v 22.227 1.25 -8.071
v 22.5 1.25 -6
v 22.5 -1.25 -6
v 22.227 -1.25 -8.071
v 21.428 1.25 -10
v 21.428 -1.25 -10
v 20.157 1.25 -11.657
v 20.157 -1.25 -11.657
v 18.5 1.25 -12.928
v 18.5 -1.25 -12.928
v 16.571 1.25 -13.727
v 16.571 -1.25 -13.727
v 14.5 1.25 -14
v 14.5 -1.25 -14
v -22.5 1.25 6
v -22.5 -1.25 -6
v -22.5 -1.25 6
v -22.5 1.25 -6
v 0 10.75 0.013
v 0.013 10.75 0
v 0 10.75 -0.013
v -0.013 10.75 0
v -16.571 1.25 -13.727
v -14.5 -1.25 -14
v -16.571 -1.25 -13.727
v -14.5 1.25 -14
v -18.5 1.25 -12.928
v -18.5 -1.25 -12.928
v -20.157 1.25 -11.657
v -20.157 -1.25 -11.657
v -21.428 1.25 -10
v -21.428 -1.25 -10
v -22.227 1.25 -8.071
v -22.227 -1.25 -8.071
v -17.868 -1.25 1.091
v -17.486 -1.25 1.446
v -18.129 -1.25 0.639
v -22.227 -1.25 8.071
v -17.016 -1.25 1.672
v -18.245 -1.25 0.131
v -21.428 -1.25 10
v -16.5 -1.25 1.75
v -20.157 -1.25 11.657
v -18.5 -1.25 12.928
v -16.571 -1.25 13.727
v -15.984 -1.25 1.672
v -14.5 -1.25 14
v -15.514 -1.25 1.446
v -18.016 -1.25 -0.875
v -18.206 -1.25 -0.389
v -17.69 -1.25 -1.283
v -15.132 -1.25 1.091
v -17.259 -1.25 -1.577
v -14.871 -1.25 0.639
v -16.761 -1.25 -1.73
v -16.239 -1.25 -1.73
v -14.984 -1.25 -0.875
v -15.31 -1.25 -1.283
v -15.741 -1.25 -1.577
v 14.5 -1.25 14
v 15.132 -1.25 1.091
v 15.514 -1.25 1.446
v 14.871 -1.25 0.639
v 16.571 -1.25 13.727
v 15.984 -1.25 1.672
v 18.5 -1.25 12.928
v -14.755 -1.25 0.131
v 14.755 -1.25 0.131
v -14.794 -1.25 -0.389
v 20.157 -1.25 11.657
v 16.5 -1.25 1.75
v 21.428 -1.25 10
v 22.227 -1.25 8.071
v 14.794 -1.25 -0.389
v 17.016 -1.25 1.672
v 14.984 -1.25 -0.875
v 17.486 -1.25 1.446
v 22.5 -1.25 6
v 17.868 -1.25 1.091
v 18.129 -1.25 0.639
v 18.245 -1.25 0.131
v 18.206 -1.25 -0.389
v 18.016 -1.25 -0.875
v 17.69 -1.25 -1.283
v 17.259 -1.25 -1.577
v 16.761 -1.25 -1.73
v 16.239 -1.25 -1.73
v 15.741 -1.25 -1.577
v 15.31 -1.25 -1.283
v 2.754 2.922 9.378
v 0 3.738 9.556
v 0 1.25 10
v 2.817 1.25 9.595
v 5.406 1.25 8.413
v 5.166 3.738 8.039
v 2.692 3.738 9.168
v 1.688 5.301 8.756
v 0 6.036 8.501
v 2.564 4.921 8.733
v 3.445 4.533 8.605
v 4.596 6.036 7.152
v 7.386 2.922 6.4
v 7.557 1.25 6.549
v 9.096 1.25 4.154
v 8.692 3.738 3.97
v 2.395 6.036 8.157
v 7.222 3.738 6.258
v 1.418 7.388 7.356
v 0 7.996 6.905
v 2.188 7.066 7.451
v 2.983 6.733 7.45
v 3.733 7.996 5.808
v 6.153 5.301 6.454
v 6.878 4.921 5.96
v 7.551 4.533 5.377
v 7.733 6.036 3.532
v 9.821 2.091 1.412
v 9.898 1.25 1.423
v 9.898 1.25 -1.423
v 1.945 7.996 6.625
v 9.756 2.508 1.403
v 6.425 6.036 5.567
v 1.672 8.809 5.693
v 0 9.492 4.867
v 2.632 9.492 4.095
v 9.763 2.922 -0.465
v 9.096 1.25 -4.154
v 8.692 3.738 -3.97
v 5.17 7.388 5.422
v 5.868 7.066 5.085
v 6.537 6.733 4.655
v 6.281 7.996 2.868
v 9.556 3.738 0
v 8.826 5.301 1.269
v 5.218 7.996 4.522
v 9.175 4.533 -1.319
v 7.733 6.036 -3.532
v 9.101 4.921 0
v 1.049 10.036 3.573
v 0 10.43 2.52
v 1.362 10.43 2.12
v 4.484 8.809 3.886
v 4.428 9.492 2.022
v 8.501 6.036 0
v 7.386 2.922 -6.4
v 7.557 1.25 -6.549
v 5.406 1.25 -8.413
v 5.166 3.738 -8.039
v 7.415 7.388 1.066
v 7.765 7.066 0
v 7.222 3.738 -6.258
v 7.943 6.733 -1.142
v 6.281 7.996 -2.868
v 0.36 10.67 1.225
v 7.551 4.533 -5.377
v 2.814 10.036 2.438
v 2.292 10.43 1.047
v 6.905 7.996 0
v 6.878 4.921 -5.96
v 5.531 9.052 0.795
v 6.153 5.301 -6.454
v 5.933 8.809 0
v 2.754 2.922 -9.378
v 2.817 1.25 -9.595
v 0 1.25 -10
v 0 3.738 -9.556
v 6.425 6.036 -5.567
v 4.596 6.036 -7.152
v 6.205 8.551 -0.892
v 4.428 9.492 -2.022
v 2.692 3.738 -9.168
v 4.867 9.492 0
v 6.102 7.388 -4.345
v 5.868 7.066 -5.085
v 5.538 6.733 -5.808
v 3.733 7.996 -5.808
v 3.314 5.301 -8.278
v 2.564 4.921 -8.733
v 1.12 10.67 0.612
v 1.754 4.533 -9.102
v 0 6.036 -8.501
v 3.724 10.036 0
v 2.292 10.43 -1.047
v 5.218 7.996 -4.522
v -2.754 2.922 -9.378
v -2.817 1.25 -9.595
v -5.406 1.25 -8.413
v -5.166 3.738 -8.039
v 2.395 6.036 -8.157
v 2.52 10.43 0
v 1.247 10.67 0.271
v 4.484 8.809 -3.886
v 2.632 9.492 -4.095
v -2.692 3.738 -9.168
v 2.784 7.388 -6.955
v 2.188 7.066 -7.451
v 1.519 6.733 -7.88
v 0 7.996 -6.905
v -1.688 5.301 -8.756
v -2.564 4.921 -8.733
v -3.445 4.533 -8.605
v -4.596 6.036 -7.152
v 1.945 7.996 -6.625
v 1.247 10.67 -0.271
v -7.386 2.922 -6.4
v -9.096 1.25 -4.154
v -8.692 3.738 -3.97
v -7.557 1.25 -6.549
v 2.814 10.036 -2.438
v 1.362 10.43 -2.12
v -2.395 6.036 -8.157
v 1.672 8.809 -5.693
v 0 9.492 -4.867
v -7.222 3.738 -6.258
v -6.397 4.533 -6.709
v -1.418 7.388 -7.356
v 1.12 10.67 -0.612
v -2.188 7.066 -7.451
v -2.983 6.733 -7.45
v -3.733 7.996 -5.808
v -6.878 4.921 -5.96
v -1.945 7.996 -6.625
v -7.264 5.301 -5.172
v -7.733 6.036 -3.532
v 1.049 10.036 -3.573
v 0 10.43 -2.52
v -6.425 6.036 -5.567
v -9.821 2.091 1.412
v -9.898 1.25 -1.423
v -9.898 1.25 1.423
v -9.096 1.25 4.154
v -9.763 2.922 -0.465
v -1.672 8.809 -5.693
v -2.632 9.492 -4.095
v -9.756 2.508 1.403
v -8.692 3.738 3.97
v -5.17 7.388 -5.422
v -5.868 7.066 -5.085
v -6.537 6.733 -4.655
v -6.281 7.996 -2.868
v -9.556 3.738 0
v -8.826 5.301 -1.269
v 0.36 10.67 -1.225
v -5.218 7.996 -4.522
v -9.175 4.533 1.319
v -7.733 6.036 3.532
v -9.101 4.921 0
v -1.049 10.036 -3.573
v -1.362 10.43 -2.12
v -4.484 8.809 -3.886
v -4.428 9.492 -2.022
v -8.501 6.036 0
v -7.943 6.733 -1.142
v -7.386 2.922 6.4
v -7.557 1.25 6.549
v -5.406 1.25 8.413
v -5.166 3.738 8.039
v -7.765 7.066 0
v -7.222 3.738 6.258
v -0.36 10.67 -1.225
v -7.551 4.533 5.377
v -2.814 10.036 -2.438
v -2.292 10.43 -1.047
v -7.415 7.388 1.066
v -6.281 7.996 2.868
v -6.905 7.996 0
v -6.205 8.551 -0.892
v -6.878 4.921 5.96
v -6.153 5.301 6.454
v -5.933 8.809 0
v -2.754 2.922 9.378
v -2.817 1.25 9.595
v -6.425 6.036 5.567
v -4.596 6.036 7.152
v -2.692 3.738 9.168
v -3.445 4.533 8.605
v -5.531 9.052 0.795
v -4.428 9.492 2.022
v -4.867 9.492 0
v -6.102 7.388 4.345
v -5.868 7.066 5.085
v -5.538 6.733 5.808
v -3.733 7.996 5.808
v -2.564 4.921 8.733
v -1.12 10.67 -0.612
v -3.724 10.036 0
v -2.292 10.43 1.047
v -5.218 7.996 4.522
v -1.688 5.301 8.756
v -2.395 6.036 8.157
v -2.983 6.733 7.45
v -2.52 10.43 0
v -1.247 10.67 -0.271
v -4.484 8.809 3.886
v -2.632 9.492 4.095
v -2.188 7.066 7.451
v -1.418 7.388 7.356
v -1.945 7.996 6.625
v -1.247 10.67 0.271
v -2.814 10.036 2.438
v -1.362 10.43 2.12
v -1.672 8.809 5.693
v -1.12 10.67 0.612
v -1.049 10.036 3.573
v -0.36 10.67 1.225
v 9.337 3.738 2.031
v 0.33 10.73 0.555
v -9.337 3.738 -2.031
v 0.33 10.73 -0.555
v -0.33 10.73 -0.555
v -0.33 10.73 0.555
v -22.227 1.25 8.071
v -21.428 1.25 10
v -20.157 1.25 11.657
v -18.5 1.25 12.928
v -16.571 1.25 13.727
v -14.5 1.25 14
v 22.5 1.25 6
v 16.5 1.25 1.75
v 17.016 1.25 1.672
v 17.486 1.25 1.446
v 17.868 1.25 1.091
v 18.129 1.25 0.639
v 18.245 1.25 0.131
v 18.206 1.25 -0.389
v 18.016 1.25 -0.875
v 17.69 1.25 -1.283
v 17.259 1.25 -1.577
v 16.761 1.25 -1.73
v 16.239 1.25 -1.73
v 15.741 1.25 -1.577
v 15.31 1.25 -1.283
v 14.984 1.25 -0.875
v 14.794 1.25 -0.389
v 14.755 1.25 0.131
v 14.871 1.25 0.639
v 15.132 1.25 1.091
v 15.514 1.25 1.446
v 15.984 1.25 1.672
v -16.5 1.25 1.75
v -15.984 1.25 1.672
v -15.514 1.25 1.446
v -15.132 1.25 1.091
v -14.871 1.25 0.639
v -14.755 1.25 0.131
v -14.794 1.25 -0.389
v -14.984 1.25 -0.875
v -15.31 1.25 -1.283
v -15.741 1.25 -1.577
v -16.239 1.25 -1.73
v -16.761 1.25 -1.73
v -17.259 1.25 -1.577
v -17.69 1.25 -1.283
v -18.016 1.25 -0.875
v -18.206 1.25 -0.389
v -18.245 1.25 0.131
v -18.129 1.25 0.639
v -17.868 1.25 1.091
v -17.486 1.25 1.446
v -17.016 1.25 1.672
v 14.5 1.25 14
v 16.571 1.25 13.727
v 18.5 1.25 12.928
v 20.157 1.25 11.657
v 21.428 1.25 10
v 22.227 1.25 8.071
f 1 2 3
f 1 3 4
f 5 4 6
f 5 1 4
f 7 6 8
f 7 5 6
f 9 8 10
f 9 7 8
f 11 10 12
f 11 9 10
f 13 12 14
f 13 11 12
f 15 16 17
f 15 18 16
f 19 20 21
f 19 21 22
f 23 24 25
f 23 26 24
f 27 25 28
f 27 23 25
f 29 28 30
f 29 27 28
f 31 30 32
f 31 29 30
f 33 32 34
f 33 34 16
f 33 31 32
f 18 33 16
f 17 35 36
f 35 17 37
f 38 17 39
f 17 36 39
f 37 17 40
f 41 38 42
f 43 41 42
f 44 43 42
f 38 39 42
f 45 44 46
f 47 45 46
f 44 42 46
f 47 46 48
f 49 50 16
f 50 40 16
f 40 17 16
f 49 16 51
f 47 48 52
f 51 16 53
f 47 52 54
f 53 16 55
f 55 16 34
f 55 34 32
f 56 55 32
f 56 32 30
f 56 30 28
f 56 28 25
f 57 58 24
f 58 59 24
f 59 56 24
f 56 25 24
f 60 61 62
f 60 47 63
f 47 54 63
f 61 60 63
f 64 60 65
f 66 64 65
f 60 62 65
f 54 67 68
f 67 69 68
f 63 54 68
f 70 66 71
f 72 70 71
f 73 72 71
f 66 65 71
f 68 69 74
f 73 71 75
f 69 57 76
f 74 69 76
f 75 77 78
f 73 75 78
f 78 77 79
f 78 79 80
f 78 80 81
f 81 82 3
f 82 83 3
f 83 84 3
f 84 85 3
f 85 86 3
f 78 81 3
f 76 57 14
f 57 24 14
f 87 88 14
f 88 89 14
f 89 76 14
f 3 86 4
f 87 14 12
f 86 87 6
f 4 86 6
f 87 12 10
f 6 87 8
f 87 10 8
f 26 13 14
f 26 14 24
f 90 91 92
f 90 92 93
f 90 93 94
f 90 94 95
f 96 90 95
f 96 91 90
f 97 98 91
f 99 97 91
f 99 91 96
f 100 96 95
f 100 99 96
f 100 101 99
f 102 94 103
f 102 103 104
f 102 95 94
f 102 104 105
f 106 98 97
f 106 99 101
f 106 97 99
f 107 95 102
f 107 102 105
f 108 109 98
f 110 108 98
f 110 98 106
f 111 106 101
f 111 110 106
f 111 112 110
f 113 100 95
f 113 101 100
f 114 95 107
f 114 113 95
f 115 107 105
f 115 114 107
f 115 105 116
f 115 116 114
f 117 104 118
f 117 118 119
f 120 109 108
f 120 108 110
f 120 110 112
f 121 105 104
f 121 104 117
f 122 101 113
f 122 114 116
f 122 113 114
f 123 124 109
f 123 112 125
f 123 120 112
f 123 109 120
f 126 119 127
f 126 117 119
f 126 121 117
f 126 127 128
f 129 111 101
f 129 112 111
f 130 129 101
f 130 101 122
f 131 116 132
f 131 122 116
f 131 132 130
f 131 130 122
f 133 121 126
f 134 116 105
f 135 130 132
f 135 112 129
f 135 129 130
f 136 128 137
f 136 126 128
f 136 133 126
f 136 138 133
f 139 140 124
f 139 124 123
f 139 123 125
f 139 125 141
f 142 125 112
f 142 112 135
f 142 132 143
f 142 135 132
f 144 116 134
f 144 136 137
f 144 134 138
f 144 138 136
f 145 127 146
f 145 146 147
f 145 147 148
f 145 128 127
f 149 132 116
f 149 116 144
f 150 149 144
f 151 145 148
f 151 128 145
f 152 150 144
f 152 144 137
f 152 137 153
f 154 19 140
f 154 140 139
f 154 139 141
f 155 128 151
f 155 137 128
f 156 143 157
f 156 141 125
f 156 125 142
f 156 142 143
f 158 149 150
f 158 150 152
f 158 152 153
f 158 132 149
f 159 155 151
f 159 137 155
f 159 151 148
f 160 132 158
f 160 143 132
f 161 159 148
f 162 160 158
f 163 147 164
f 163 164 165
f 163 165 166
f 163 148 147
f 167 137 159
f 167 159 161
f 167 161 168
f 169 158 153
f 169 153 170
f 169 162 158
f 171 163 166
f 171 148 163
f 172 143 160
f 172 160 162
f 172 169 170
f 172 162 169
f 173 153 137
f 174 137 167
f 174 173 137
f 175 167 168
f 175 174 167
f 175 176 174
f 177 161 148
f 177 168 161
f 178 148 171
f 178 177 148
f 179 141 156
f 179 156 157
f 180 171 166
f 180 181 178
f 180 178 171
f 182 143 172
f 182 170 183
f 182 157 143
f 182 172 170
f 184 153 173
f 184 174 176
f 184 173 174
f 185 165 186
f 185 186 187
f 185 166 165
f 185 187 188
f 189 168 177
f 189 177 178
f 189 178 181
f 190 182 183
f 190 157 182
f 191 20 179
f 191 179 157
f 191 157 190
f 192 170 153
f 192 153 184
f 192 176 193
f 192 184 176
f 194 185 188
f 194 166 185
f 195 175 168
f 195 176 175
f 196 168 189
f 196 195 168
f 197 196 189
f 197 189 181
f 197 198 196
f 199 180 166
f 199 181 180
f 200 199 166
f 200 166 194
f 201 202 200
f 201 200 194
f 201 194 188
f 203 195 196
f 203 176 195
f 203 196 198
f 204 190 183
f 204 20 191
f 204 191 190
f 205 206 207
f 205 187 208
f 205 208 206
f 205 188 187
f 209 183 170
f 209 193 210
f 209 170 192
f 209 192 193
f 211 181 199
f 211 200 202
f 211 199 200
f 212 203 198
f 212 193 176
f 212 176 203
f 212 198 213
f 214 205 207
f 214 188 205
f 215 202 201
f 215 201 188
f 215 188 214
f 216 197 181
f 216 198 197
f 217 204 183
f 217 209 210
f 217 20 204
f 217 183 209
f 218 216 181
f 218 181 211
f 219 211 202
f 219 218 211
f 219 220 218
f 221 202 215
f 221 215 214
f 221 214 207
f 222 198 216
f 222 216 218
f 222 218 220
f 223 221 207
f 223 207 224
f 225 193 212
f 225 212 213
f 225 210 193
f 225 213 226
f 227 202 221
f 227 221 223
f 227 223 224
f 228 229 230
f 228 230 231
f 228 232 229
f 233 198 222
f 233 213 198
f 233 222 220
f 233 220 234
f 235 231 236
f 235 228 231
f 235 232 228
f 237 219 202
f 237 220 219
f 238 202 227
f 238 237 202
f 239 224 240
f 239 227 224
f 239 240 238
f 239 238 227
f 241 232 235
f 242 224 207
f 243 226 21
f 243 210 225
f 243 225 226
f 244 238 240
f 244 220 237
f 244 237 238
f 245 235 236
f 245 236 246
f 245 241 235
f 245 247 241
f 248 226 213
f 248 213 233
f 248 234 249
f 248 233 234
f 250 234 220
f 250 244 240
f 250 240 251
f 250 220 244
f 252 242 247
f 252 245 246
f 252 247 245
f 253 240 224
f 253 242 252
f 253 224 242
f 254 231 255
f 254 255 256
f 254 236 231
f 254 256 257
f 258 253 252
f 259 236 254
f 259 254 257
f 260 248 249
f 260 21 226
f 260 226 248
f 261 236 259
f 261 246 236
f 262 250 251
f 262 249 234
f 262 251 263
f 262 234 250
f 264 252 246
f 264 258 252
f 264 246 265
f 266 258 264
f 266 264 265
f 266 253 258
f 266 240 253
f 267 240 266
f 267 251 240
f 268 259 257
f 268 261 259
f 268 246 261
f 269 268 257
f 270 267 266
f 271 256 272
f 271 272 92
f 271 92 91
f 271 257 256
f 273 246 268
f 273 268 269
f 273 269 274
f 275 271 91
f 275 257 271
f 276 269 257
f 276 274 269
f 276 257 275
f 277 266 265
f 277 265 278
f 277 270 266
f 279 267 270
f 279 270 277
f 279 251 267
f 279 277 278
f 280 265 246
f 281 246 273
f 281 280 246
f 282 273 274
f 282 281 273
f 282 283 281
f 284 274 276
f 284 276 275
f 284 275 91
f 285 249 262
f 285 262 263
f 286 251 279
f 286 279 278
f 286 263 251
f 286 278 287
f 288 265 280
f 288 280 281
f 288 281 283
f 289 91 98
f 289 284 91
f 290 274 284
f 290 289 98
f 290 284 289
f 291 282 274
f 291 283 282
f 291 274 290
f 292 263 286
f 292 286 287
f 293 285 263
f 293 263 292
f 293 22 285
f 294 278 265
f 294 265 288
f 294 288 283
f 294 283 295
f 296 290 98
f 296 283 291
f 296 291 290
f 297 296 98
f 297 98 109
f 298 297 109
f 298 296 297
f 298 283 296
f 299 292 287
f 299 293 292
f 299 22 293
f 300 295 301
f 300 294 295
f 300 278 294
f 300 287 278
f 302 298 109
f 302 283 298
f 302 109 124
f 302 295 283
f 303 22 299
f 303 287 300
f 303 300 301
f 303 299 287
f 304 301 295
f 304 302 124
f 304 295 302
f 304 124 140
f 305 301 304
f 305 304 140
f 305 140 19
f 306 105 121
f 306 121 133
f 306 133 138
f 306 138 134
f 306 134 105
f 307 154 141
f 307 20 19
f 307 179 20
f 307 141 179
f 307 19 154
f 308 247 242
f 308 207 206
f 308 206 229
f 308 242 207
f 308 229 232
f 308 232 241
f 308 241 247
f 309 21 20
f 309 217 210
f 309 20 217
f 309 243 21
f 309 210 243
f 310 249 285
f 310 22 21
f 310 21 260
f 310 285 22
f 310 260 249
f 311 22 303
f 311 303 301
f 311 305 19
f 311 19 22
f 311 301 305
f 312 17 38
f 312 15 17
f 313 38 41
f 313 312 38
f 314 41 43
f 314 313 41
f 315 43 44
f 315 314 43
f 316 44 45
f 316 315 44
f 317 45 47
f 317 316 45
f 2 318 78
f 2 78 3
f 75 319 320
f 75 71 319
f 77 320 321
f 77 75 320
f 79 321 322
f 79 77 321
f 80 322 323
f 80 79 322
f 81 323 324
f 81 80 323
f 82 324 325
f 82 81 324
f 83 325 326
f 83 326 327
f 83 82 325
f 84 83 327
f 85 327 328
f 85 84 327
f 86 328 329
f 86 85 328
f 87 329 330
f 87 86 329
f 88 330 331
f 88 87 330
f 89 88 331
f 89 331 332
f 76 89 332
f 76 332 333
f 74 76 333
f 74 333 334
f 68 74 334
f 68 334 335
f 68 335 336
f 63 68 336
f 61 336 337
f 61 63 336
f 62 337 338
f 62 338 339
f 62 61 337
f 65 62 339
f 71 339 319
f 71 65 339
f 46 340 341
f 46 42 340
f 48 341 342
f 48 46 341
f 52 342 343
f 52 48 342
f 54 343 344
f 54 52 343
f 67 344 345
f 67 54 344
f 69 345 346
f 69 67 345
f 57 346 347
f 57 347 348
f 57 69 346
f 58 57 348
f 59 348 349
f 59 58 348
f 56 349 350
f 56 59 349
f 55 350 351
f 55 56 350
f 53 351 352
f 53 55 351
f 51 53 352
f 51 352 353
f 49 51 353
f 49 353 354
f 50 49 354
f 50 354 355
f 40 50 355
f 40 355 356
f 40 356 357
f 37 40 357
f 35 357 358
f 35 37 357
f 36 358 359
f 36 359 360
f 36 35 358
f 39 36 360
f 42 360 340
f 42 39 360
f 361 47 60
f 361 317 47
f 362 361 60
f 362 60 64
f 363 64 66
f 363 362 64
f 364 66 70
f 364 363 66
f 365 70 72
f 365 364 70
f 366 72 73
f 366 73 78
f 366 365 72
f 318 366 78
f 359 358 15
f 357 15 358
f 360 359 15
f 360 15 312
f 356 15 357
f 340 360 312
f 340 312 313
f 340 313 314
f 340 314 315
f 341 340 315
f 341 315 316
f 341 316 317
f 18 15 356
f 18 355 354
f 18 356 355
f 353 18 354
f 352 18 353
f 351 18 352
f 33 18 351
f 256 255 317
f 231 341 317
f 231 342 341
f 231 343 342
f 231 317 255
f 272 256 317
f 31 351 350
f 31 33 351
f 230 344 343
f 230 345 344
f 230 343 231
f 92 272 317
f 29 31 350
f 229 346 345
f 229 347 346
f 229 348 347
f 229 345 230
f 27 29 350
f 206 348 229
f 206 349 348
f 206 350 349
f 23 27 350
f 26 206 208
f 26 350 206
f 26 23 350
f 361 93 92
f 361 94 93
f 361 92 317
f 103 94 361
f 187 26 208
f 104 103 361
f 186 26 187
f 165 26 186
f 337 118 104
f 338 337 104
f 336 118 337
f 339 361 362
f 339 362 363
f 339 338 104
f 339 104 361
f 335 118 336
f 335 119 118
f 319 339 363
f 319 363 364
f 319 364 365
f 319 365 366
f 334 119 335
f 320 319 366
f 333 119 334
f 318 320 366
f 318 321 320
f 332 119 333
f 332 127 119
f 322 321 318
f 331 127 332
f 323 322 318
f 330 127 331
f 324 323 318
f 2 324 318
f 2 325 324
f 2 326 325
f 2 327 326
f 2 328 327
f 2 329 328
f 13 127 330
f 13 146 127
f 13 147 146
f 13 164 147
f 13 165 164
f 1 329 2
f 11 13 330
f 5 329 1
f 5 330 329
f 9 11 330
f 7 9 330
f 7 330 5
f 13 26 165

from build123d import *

# Parameters (mm, degrees)
SKETCH1_R           = 1.75
BOSS_EXTRUDE1_DEPTH = 1.25
SKETCH2_R           = 10
BOSS_EXTRUDE2_DEPTH = 9.5
FILLET1_R           = 10


with BuildPart() as part:
    # Sketch1 → Boss-Extrude1 (new, symmetric)
    with BuildSketch(Plane(origin=(0, 0, 0), x_dir=(1, 0, 0), z_dir=(0, 1, 0))):
        with BuildLine():
            Line((-14.5, -14), (14.5, -14))
            ThreePointArc((14.5, -14), (20.156854249, -11.656854249), (22.5, -6))
            Line((22.5, -6), (22.5, 6))
            ThreePointArc((22.5, 6), (20.156854249, 11.656854249), (14.5, 14))
            Line((14.5, 14), (-14.5, 14))
            ThreePointArc((-14.5, 14), (-20.156854249, 11.656854249), (-22.5, 6))
            Line((-22.5, 6), (-22.5, -6))
            ThreePointArc((-22.5, -6), (-20.156854249, -11.656854249), (-14.5, -14))
        make_face()
        with Locations(Location((16.5, 0, 0), (0, 0, 270))):
            Circle(SKETCH1_R, mode=Mode.SUBTRACT)
        with Locations(Location((-16.5, 0, 0), (0, 0, 270))):
            Circle(SKETCH1_R, mode=Mode.SUBTRACT)
    extrude(amount=BOSS_EXTRUDE1_DEPTH, both=True)

    # Sketch2 → Boss-Extrude2 (add)
    with BuildSketch(Plane(origin=(0, 1.25, 0), x_dir=(1, 0, 0), z_dir=(0, 1, 0))):
        with Locations(Location((0, 0, 0), (0, 0, 270))):
            Circle(SKETCH2_R)
    extrude(amount=BOSS_EXTRUDE2_DEPTH)

    # Fillet1
    # the kernel refuses this fillet: 10 mm, written as the material it takes off along each edge
    with BuildSketch(Plane(origin=(0, 10.75, 0), x_dir=(0, 0, 1), z_dir=(-1, 0, 0))) as fillet1_piece_1:
        with BuildLine():
            CenterArc((0.012507822, -10), FILLET1_R, 2.865983983, 87.134016017)
            Line((0.012507822, 0), (0.012507822, 0.2))
            Line((0.012507822, 0.2), (10, 0.2))
            Line((10, 0.2), (10.2, 0))
            ThreePointArc((10.2, 0), (10.2, -4.75), (10.199749844, -9.49))
            Line((10.199749844, -9.49), (10, -9.5))
        make_face()
    revolve(axis=Axis((0, 10.75, 0), (0, 1, 0)), mode=Mode.SUBTRACT)


solid = part.part
